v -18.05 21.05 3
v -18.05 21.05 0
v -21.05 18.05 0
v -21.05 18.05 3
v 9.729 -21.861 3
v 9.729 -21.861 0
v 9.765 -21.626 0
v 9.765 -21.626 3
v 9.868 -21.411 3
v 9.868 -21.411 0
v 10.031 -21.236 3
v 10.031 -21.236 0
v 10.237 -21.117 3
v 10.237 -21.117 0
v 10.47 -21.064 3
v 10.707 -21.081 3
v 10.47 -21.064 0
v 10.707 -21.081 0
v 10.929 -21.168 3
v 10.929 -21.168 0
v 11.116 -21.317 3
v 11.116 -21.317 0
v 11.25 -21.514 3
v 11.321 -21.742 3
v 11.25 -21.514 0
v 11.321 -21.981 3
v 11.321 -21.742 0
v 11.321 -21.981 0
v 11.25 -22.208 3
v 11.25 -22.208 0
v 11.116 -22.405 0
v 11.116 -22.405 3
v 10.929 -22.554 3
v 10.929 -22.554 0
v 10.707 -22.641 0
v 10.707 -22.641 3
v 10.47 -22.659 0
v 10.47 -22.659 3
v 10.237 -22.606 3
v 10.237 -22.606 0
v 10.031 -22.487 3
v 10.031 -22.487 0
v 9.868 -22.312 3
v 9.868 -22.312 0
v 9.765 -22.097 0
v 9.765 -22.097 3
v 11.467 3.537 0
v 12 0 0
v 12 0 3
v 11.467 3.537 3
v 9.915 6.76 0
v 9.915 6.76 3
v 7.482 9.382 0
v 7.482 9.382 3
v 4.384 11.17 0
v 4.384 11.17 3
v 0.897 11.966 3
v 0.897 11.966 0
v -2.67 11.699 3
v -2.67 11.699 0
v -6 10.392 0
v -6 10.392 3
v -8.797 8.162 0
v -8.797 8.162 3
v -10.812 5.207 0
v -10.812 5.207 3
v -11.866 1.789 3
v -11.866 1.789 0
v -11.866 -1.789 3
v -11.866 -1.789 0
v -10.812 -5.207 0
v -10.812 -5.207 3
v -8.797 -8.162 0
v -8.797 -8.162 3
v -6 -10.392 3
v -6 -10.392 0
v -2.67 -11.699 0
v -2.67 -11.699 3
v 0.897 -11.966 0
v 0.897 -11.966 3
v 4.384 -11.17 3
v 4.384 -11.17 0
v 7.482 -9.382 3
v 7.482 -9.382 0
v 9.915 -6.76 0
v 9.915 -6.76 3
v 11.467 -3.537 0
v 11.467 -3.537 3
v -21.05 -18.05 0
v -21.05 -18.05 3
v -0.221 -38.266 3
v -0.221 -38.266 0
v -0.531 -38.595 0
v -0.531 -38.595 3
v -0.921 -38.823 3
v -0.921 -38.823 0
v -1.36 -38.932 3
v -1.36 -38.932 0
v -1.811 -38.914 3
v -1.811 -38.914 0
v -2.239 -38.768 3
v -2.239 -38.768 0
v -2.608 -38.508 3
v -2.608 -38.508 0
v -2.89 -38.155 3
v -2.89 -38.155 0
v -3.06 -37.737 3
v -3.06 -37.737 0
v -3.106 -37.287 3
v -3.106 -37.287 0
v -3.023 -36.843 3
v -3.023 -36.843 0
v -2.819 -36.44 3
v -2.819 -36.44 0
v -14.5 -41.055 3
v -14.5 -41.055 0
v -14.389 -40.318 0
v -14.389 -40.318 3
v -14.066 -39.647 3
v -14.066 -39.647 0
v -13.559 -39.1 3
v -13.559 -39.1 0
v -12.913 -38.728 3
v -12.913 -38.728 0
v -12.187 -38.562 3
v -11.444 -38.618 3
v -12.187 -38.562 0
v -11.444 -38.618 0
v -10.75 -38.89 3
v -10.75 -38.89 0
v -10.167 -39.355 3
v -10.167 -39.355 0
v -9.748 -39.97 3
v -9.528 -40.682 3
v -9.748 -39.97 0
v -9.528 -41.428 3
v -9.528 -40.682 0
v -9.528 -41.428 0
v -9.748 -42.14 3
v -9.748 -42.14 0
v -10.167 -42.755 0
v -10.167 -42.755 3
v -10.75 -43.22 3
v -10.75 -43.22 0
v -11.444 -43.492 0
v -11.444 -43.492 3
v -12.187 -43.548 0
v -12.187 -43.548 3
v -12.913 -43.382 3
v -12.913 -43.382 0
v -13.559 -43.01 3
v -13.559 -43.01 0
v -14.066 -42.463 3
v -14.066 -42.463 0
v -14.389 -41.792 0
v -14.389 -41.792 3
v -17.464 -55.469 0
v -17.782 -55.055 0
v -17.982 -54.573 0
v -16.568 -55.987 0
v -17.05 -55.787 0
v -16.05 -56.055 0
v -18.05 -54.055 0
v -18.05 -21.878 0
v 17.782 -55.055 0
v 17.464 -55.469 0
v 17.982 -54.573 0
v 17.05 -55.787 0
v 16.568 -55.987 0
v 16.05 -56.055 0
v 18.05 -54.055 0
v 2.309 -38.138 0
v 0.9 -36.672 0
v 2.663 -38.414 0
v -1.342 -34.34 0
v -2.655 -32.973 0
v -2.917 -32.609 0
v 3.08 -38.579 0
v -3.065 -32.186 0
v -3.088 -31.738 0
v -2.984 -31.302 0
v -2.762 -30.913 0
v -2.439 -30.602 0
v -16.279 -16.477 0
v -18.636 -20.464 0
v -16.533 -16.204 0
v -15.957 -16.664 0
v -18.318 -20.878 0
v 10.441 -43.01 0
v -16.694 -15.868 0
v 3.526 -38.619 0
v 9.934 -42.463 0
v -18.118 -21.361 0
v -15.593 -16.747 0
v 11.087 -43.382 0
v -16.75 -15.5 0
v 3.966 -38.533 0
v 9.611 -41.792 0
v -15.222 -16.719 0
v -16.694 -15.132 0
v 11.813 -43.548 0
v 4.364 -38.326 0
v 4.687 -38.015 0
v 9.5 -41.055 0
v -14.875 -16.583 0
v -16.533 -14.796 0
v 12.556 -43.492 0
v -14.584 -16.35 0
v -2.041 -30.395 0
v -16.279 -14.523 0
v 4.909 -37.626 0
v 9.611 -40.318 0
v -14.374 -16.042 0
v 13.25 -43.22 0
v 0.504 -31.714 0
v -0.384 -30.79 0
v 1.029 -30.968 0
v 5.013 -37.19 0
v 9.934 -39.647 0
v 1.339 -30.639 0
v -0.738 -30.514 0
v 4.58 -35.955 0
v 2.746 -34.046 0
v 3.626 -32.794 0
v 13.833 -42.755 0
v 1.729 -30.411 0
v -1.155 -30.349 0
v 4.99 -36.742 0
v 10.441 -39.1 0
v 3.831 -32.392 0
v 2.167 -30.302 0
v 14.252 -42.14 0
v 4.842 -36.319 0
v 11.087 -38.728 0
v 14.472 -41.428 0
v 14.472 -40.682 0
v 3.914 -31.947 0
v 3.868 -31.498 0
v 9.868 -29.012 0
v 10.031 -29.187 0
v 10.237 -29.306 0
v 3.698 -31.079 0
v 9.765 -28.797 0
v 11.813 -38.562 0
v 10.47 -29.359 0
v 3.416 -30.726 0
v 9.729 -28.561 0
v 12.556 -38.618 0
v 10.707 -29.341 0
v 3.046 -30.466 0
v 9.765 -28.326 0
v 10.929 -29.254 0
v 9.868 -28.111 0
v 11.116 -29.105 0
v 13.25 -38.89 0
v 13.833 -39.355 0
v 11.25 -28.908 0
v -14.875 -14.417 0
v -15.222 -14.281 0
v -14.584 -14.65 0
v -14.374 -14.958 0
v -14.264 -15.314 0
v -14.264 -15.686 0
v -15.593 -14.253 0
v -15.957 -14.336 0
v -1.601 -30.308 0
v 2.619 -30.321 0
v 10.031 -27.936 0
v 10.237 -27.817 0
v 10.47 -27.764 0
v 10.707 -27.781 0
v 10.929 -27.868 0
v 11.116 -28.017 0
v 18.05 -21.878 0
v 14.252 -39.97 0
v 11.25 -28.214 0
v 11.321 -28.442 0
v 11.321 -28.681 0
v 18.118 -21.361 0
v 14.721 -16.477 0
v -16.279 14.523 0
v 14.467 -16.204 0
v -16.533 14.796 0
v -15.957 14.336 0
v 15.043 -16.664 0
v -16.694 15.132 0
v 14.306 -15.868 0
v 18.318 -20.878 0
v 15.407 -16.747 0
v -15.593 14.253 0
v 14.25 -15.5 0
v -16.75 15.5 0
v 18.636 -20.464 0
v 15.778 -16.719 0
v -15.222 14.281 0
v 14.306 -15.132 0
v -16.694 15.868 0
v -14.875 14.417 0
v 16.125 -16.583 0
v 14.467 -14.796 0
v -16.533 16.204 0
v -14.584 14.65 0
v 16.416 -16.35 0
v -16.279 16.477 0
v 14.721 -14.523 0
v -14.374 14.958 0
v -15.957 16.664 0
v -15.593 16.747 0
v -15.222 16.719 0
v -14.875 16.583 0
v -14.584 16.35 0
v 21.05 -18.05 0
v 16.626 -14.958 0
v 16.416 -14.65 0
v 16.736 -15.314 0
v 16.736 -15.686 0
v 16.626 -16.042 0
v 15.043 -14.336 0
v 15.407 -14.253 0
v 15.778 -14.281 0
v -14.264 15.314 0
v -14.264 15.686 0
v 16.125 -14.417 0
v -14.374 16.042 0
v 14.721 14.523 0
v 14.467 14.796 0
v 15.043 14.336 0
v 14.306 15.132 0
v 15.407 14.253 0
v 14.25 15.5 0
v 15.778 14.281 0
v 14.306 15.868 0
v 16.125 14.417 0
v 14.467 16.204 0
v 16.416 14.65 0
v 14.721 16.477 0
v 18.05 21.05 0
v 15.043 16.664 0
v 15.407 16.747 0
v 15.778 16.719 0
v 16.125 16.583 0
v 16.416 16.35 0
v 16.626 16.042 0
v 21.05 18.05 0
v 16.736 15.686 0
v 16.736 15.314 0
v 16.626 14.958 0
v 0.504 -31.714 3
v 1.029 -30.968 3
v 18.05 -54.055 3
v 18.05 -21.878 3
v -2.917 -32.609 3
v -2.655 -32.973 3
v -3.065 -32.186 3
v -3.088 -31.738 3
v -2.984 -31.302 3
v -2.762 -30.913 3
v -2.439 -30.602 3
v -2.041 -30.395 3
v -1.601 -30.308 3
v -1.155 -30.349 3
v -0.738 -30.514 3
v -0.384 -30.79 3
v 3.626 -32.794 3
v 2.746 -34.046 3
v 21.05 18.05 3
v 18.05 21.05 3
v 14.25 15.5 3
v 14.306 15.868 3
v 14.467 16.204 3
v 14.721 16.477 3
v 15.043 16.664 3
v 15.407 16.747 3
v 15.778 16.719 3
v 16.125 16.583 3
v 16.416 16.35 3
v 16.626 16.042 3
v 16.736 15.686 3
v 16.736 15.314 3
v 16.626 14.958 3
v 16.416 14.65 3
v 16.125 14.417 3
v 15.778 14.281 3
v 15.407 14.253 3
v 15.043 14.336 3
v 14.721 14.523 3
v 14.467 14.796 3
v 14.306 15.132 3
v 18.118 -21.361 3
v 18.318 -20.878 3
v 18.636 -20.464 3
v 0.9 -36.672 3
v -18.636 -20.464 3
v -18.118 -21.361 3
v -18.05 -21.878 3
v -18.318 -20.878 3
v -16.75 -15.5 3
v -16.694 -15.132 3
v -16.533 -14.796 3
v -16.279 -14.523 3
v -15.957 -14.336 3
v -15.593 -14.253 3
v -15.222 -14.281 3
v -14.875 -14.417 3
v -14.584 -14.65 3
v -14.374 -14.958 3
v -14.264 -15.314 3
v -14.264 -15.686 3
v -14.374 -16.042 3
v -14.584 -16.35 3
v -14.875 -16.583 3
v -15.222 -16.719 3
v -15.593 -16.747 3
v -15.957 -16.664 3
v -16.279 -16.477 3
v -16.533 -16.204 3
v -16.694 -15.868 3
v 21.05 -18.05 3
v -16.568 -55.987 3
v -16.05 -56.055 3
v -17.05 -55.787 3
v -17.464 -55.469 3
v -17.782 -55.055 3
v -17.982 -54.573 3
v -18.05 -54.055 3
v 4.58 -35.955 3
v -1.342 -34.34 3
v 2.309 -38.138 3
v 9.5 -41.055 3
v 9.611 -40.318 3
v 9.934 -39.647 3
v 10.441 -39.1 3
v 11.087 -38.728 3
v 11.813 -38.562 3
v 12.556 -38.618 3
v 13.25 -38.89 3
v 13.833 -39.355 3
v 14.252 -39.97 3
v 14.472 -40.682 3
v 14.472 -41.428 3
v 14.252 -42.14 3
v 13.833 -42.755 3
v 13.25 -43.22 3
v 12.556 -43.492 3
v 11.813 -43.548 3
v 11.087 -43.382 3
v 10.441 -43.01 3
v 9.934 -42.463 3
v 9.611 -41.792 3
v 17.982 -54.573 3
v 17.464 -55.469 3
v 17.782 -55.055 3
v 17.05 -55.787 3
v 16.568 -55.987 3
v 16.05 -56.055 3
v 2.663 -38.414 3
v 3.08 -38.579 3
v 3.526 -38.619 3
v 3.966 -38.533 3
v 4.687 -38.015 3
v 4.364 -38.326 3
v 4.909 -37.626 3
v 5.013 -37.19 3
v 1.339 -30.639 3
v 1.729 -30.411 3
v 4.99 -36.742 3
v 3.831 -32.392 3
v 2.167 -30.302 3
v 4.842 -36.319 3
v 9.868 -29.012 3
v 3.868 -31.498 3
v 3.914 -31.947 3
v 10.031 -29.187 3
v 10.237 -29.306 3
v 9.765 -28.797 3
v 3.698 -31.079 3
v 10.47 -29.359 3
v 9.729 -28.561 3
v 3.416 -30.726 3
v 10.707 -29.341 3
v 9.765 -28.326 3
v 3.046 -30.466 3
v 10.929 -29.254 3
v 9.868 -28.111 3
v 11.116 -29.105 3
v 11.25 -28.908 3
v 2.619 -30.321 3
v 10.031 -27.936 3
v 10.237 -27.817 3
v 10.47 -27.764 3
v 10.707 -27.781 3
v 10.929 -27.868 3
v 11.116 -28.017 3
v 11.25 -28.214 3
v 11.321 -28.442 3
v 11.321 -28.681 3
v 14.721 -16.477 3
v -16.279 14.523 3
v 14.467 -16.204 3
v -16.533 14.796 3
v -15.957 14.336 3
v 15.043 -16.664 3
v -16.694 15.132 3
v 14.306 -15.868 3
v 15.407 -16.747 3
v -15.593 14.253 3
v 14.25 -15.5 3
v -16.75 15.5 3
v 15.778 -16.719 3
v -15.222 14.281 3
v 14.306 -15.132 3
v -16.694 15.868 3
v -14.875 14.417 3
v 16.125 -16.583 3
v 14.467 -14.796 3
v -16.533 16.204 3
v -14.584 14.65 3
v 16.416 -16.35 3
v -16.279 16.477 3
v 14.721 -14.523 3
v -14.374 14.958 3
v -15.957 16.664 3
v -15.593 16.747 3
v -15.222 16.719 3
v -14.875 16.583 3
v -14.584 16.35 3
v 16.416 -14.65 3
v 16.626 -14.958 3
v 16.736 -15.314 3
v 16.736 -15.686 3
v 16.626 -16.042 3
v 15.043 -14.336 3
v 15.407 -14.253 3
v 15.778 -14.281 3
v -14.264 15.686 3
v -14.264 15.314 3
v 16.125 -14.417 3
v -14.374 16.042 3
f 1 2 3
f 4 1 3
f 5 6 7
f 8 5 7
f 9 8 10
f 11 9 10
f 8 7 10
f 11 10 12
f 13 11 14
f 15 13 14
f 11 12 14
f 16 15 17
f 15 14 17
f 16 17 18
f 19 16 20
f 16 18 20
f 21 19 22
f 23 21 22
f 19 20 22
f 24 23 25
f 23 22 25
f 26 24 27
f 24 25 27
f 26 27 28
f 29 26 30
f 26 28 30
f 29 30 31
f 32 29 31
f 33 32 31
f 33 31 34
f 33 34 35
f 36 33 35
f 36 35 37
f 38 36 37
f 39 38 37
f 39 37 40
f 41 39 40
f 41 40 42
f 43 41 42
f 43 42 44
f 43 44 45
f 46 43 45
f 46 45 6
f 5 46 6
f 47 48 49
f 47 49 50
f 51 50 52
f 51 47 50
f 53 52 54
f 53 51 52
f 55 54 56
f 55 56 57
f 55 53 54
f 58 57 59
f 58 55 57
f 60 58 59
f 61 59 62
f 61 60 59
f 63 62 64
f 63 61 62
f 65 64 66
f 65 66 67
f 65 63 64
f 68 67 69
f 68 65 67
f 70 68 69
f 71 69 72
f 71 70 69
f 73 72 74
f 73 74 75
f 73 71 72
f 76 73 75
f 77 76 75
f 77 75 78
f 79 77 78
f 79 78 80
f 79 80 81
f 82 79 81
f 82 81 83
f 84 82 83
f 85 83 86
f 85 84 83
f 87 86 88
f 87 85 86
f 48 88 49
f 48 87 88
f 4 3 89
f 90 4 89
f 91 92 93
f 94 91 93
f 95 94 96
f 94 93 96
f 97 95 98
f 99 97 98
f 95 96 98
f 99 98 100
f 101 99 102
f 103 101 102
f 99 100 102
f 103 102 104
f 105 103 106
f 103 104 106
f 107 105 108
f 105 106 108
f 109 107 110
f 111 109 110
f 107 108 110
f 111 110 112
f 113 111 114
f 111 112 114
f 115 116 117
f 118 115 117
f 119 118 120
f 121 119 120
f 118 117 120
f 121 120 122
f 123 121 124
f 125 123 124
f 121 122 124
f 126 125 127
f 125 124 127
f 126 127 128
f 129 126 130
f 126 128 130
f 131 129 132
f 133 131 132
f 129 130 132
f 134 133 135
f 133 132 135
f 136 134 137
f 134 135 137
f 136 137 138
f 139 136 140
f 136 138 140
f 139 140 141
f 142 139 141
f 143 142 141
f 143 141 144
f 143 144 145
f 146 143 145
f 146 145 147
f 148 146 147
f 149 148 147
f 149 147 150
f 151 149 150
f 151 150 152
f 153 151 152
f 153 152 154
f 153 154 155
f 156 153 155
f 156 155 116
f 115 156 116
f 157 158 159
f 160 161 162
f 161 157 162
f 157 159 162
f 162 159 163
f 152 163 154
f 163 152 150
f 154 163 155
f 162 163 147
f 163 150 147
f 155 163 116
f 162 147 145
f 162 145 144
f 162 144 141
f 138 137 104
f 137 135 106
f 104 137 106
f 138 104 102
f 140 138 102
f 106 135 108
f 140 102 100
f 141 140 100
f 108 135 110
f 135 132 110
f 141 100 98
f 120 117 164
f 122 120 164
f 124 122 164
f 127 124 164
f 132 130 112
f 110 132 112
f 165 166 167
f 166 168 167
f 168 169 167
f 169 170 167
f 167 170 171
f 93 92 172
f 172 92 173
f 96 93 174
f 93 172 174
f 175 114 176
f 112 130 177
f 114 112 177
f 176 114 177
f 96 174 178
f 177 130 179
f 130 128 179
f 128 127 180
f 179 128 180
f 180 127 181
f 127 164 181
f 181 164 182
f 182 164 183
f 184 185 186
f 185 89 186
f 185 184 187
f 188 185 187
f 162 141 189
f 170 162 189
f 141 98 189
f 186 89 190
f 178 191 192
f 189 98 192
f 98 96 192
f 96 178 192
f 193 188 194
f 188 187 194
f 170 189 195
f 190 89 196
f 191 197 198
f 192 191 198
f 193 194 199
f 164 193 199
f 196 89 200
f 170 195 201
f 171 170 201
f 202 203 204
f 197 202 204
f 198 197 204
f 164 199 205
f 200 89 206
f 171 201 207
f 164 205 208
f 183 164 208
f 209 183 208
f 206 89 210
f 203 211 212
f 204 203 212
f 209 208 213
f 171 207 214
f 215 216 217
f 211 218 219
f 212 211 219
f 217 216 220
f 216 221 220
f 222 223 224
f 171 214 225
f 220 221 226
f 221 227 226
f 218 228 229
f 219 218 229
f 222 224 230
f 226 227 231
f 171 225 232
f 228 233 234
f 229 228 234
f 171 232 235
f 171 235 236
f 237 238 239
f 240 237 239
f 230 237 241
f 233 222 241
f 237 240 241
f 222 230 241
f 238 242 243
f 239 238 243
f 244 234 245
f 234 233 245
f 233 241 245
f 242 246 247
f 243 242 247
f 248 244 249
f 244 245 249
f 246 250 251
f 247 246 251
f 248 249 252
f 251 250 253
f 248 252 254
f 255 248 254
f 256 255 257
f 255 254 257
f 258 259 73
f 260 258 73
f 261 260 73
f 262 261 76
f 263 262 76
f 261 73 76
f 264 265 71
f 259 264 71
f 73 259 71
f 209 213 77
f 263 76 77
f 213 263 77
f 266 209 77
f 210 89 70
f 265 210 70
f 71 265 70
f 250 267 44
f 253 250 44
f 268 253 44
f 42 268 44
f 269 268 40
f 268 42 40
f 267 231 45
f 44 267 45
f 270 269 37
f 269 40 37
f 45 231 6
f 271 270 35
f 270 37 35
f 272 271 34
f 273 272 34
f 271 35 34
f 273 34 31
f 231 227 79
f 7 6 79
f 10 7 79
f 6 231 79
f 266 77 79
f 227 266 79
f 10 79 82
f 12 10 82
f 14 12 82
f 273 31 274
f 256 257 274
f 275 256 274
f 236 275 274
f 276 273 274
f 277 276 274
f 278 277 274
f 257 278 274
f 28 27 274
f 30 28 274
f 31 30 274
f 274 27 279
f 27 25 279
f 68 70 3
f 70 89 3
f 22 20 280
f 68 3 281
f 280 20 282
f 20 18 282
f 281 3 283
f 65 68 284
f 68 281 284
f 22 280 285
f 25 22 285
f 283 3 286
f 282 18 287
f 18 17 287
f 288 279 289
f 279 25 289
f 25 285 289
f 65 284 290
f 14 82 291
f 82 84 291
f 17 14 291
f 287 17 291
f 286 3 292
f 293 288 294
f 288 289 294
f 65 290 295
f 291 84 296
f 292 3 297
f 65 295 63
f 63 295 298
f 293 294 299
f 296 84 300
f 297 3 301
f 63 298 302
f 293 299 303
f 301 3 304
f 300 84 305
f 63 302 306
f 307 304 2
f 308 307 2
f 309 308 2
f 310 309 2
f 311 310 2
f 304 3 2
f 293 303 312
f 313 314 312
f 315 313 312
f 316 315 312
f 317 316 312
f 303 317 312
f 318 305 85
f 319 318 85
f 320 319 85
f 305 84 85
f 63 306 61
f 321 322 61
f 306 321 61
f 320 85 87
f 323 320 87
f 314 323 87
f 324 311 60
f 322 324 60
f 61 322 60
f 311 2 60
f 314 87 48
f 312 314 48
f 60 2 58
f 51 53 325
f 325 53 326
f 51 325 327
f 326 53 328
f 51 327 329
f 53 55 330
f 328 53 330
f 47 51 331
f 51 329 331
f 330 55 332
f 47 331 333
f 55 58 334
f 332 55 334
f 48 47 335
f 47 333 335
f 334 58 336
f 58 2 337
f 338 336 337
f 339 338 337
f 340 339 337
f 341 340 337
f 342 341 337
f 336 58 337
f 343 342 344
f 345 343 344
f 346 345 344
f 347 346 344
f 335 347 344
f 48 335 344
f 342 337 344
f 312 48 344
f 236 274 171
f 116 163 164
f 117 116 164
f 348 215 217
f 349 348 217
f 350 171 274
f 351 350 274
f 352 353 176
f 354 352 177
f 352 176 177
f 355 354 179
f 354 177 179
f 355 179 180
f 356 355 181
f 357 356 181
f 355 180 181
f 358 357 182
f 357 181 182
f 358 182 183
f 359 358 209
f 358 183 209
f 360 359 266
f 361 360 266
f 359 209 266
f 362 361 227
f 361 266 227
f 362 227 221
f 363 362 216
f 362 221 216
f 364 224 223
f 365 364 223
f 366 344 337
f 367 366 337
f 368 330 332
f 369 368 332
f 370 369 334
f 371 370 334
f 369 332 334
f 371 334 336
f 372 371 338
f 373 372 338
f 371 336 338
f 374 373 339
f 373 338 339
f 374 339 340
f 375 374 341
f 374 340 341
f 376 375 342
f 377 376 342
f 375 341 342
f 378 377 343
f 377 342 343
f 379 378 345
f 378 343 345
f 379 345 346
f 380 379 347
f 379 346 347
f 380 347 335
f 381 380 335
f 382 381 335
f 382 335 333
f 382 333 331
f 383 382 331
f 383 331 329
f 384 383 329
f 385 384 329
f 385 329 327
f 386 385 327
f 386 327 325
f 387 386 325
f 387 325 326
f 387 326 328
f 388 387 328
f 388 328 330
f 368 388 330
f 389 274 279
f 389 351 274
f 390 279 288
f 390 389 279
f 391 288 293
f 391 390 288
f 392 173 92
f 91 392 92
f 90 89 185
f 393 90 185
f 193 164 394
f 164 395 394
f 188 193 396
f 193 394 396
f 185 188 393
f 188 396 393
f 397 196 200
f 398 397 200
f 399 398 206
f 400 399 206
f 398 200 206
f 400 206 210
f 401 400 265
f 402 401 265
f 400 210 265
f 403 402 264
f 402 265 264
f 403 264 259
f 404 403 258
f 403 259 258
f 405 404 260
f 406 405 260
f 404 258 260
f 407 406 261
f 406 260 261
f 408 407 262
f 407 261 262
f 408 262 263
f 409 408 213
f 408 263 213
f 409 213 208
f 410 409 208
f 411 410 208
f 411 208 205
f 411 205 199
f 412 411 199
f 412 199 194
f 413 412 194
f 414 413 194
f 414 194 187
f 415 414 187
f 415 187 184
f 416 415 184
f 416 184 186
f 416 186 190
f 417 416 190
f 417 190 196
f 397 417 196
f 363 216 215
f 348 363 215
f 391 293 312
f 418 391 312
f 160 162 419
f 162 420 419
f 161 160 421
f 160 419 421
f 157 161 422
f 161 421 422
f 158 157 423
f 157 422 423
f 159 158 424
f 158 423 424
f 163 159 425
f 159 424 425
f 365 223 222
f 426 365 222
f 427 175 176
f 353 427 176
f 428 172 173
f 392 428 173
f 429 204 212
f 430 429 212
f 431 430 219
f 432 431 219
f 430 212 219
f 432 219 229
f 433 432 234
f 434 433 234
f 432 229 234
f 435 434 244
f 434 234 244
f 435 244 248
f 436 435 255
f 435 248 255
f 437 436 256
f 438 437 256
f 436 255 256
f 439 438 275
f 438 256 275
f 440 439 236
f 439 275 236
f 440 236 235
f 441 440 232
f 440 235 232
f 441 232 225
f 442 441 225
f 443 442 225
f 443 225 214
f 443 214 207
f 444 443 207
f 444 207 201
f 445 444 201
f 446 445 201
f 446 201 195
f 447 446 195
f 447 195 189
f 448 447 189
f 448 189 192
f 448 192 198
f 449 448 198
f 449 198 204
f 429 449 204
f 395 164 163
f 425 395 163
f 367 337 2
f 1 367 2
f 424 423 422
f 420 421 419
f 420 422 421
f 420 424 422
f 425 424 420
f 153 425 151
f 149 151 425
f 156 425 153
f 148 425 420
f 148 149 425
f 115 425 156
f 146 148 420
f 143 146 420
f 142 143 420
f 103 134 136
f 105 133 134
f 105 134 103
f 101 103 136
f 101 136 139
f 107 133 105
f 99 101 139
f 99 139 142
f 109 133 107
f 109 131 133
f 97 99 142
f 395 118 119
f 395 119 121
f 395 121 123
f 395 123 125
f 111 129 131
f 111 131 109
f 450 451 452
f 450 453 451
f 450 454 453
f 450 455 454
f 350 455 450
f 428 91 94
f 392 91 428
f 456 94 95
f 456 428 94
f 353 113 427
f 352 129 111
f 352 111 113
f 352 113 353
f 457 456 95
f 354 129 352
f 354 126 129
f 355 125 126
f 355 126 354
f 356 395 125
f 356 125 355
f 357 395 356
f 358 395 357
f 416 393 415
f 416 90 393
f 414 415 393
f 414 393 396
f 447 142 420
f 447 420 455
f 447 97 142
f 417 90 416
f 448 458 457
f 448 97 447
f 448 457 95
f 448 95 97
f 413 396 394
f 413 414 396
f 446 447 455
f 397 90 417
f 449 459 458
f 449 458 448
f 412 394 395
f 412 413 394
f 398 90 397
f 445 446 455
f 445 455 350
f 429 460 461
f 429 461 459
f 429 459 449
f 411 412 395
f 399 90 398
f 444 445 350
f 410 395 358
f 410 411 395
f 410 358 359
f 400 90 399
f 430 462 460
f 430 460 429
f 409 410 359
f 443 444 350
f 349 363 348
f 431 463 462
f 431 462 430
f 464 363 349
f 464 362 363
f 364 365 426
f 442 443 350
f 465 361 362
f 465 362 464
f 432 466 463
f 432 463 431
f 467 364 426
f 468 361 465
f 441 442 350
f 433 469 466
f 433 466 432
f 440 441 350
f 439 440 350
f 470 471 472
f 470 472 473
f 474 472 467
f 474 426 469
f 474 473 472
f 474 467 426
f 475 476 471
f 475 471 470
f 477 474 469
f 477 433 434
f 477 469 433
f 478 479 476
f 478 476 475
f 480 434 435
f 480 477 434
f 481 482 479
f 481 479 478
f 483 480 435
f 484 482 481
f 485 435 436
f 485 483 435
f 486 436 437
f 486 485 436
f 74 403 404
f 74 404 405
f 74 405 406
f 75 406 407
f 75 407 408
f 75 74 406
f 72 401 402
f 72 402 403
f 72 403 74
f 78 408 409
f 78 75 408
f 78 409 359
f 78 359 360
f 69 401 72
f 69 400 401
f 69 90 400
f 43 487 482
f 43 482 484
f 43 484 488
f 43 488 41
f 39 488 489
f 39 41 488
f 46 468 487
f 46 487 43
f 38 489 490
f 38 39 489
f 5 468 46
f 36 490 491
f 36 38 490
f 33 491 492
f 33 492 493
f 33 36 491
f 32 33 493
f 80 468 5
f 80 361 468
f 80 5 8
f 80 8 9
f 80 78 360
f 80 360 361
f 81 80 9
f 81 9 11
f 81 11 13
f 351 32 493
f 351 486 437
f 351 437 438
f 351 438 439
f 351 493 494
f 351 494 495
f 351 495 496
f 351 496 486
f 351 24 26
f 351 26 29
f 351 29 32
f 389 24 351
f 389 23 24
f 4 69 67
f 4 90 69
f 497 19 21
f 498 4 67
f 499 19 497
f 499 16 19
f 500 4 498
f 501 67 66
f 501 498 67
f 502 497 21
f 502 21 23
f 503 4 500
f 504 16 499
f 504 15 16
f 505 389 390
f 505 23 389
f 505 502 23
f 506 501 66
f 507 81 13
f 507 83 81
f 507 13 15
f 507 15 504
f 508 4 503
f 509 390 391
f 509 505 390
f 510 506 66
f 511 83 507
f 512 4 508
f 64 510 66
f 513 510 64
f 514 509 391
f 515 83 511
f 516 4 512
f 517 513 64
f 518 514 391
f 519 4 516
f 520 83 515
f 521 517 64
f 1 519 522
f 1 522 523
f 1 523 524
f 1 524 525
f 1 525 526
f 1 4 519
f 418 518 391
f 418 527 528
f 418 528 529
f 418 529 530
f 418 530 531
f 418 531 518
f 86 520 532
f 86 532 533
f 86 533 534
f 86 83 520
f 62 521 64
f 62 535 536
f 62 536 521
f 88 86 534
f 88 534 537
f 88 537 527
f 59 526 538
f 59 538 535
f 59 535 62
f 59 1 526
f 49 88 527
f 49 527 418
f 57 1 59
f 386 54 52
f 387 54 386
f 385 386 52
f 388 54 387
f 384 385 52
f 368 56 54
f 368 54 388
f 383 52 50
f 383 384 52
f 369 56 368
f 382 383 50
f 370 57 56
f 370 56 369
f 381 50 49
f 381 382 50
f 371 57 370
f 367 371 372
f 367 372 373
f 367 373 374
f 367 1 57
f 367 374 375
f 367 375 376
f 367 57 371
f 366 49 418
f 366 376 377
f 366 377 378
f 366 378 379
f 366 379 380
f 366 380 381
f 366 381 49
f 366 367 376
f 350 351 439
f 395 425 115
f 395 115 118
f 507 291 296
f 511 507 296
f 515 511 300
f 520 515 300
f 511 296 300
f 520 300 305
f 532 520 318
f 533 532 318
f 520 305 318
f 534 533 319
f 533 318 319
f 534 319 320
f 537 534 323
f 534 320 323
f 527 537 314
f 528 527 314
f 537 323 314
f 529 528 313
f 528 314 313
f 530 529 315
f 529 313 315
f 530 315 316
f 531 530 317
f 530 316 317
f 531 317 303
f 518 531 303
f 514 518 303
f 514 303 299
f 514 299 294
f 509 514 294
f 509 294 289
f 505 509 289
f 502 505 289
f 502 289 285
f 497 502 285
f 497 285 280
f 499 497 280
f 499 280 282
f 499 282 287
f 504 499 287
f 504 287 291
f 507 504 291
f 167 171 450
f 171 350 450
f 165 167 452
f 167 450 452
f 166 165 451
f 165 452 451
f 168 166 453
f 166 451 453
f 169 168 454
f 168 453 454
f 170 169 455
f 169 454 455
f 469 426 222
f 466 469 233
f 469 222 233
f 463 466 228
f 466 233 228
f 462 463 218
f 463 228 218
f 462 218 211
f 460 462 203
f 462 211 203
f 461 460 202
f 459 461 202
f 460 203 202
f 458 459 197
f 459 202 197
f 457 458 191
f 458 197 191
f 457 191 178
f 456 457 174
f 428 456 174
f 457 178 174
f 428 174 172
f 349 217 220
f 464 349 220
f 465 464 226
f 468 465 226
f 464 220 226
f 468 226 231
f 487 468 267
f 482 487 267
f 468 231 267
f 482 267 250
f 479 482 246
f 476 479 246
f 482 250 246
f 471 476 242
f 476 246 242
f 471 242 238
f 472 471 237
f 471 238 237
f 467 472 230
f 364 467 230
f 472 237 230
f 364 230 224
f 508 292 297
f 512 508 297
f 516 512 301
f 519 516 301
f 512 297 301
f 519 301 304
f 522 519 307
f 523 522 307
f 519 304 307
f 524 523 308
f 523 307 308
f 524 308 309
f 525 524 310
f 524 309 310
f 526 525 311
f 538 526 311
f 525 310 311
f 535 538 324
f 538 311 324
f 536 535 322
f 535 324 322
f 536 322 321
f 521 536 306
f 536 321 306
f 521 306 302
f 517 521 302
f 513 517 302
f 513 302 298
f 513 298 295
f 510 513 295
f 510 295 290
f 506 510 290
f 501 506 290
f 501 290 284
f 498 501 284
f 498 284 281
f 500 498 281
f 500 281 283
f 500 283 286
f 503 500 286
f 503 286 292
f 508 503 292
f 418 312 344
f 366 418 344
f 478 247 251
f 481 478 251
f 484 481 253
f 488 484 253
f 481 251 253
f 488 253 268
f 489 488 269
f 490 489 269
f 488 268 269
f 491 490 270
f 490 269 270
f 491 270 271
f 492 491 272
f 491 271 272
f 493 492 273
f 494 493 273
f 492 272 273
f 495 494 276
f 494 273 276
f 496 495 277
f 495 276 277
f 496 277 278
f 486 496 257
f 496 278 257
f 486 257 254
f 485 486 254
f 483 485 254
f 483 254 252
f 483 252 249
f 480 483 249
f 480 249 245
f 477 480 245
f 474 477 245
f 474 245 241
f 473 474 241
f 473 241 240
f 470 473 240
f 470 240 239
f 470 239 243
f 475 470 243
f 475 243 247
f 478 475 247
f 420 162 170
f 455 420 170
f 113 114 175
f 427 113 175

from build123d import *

# Parameters (mm, degrees)
SKETCH1_R                   = 12
BOSS_EXTRUDE1_DEPTH         = 3
TAP_DRILL_FOR_M3_TAP1_D     = 2.5
TAP_DRILL_FOR_M3_TAP1_DEPTH = 5
TAP_DRILL_FOR_M3_TAP1_TIP   = 0.751075774
TAP_DRILL_FOR_M4_TAP1_D     = 5
TAP_DRILL_FOR_M4_TAP1_DEPTH = 5
TAP_DRILL_FOR_M4_TAP1_TIP   = 1.502151548
FILLET1_R                   = 2
TAP_DRILL_FOR_M2_TAP1_D     = 1.6
TAP_DRILL_FOR_M2_TAP1_DEPTH = 5
TAP_DRILL_FOR_M2_TAP1_TIP   = 0.480688495
CUT_EXTRUDE1_DEPTH          = 10


with BuildPart() as part:
    # Sketch1 → Boss-Extrude1 (new body)
    with BuildSketch(Plane.XY):
        Polygon((18.05, -56.055), (18.05, -21.05), (21.05, -18.05), (21.05, 18.05), (18.05, 21.05), (-18.05, 21.05), (-21.05, 18.05), (-21.05, -18.05), (-18.05, -21.05), (-18.05, -56.055), align=None)
        Circle(SKETCH1_R, mode=Mode.SUBTRACT)
    extrude(amount=BOSS_EXTRUDE1_DEPTH)

    # Tap Drill for M3 Tap1
    with Locations(Plane.XY.offset(3)):
        with Locations((-15.5, 15.5), (15.5, 15.5), (-15.5, -15.5), (15.5, -15.5)):
            Hole(TAP_DRILL_FOR_M3_TAP1_D / 2, depth=TAP_DRILL_FOR_M3_TAP1_DEPTH)
            with Locations((0, 0, -(TAP_DRILL_FOR_M3_TAP1_DEPTH + TAP_DRILL_FOR_M3_TAP1_TIP / 2))):  # 118° drill point
                Cone(0, TAP_DRILL_FOR_M3_TAP1_D / 2, TAP_DRILL_FOR_M3_TAP1_TIP, mode=Mode.SUBTRACT)

    # Tap Drill for M4 Tap1
    with Locations(Plane.XY.offset(3)):
        with Locations((12, -41.055), (-12, -41.055)):
            Hole(TAP_DRILL_FOR_M4_TAP1_D / 2, depth=TAP_DRILL_FOR_M4_TAP1_DEPTH)
            with Locations((0, 0, -(TAP_DRILL_FOR_M4_TAP1_DEPTH + TAP_DRILL_FOR_M4_TAP1_TIP / 2))):  # 118° drill point
                Cone(0, TAP_DRILL_FOR_M4_TAP1_D / 2, TAP_DRILL_FOR_M4_TAP1_TIP, mode=Mode.SUBTRACT)

    # Fillet1
    fillet1_edges = [part.edges().sort_by_distance(p)[0] for p in [
        (18.05, -21.05, 1.5),
        (18.05, -56.055, 1.5),
        (-18.05, -56.055, 1.5),
        (-18.05, -21.05, 1.5),
    ]]
    fillet(fillet1_edges, radius=FILLET1_R)

    # Tap Drill for M2 Tap1
    with Locations(Plane.XY.offset(3)):
        with Locations((10.52945603, -21.86131015), (10.52945603, -28.56131015)):
            Hole(TAP_DRILL_FOR_M2_TAP1_D / 2, depth=TAP_DRILL_FOR_M2_TAP1_DEPTH)
            with Locations((0, 0, -(TAP_DRILL_FOR_M2_TAP1_DEPTH + TAP_DRILL_FOR_M2_TAP1_TIP / 2))):  # 118° drill point
                Cone(0, TAP_DRILL_FOR_M2_TAP1_D / 2, TAP_DRILL_FOR_M2_TAP1_TIP, mode=Mode.SUBTRACT)

    # Sketch8 → Cut-Extrude1 (cut)
    with BuildSketch(Plane.XY):
        with BuildLine():
            Line((0.899883871, -36.671612752), (-0.221262765, -38.266132411))
            ThreePointArc((-0.221262765, -38.266132411), (-2.432977147, -38.651660606), (-2.818505343, -36.439946223))
            Line((-2.818505343, -36.439946223), (-1.341666159, -34.339552718))
            Line((-1.341666159, -34.339552718), (-2.655433384, -32.972737792))
            ThreePointArc((-2.655433384, -32.972737792), (-2.611361373, -30.745711142), (-0.384334723, -30.789783153))
            Line((-0.384334723, -30.789783153), (0.504250938, -31.714248402))
            Line((0.504250938, -31.714248402), (1.028839157, -30.968167379))
            ThreePointArc((1.028839157, -30.968167379), (3.24055354, -30.582639184), (3.626081735, -32.794353566))
            Line((3.626081735, -32.794353566), (2.745800968, -34.046308435))
            Line((2.745800968, -34.046308435), (4.580323387, -35.954905771))
            ThreePointArc((4.580323387, -35.954905771), (4.536251377, -38.181932421), (2.309224727, -38.137860411))
            Line((2.309224727, -38.137860411), (0.899883871, -36.671612752))
        make_face()
    extrude(amount=CUT_EXTRUDE1_DEPTH, mode=Mode.SUBTRACT)


solid = part.part
